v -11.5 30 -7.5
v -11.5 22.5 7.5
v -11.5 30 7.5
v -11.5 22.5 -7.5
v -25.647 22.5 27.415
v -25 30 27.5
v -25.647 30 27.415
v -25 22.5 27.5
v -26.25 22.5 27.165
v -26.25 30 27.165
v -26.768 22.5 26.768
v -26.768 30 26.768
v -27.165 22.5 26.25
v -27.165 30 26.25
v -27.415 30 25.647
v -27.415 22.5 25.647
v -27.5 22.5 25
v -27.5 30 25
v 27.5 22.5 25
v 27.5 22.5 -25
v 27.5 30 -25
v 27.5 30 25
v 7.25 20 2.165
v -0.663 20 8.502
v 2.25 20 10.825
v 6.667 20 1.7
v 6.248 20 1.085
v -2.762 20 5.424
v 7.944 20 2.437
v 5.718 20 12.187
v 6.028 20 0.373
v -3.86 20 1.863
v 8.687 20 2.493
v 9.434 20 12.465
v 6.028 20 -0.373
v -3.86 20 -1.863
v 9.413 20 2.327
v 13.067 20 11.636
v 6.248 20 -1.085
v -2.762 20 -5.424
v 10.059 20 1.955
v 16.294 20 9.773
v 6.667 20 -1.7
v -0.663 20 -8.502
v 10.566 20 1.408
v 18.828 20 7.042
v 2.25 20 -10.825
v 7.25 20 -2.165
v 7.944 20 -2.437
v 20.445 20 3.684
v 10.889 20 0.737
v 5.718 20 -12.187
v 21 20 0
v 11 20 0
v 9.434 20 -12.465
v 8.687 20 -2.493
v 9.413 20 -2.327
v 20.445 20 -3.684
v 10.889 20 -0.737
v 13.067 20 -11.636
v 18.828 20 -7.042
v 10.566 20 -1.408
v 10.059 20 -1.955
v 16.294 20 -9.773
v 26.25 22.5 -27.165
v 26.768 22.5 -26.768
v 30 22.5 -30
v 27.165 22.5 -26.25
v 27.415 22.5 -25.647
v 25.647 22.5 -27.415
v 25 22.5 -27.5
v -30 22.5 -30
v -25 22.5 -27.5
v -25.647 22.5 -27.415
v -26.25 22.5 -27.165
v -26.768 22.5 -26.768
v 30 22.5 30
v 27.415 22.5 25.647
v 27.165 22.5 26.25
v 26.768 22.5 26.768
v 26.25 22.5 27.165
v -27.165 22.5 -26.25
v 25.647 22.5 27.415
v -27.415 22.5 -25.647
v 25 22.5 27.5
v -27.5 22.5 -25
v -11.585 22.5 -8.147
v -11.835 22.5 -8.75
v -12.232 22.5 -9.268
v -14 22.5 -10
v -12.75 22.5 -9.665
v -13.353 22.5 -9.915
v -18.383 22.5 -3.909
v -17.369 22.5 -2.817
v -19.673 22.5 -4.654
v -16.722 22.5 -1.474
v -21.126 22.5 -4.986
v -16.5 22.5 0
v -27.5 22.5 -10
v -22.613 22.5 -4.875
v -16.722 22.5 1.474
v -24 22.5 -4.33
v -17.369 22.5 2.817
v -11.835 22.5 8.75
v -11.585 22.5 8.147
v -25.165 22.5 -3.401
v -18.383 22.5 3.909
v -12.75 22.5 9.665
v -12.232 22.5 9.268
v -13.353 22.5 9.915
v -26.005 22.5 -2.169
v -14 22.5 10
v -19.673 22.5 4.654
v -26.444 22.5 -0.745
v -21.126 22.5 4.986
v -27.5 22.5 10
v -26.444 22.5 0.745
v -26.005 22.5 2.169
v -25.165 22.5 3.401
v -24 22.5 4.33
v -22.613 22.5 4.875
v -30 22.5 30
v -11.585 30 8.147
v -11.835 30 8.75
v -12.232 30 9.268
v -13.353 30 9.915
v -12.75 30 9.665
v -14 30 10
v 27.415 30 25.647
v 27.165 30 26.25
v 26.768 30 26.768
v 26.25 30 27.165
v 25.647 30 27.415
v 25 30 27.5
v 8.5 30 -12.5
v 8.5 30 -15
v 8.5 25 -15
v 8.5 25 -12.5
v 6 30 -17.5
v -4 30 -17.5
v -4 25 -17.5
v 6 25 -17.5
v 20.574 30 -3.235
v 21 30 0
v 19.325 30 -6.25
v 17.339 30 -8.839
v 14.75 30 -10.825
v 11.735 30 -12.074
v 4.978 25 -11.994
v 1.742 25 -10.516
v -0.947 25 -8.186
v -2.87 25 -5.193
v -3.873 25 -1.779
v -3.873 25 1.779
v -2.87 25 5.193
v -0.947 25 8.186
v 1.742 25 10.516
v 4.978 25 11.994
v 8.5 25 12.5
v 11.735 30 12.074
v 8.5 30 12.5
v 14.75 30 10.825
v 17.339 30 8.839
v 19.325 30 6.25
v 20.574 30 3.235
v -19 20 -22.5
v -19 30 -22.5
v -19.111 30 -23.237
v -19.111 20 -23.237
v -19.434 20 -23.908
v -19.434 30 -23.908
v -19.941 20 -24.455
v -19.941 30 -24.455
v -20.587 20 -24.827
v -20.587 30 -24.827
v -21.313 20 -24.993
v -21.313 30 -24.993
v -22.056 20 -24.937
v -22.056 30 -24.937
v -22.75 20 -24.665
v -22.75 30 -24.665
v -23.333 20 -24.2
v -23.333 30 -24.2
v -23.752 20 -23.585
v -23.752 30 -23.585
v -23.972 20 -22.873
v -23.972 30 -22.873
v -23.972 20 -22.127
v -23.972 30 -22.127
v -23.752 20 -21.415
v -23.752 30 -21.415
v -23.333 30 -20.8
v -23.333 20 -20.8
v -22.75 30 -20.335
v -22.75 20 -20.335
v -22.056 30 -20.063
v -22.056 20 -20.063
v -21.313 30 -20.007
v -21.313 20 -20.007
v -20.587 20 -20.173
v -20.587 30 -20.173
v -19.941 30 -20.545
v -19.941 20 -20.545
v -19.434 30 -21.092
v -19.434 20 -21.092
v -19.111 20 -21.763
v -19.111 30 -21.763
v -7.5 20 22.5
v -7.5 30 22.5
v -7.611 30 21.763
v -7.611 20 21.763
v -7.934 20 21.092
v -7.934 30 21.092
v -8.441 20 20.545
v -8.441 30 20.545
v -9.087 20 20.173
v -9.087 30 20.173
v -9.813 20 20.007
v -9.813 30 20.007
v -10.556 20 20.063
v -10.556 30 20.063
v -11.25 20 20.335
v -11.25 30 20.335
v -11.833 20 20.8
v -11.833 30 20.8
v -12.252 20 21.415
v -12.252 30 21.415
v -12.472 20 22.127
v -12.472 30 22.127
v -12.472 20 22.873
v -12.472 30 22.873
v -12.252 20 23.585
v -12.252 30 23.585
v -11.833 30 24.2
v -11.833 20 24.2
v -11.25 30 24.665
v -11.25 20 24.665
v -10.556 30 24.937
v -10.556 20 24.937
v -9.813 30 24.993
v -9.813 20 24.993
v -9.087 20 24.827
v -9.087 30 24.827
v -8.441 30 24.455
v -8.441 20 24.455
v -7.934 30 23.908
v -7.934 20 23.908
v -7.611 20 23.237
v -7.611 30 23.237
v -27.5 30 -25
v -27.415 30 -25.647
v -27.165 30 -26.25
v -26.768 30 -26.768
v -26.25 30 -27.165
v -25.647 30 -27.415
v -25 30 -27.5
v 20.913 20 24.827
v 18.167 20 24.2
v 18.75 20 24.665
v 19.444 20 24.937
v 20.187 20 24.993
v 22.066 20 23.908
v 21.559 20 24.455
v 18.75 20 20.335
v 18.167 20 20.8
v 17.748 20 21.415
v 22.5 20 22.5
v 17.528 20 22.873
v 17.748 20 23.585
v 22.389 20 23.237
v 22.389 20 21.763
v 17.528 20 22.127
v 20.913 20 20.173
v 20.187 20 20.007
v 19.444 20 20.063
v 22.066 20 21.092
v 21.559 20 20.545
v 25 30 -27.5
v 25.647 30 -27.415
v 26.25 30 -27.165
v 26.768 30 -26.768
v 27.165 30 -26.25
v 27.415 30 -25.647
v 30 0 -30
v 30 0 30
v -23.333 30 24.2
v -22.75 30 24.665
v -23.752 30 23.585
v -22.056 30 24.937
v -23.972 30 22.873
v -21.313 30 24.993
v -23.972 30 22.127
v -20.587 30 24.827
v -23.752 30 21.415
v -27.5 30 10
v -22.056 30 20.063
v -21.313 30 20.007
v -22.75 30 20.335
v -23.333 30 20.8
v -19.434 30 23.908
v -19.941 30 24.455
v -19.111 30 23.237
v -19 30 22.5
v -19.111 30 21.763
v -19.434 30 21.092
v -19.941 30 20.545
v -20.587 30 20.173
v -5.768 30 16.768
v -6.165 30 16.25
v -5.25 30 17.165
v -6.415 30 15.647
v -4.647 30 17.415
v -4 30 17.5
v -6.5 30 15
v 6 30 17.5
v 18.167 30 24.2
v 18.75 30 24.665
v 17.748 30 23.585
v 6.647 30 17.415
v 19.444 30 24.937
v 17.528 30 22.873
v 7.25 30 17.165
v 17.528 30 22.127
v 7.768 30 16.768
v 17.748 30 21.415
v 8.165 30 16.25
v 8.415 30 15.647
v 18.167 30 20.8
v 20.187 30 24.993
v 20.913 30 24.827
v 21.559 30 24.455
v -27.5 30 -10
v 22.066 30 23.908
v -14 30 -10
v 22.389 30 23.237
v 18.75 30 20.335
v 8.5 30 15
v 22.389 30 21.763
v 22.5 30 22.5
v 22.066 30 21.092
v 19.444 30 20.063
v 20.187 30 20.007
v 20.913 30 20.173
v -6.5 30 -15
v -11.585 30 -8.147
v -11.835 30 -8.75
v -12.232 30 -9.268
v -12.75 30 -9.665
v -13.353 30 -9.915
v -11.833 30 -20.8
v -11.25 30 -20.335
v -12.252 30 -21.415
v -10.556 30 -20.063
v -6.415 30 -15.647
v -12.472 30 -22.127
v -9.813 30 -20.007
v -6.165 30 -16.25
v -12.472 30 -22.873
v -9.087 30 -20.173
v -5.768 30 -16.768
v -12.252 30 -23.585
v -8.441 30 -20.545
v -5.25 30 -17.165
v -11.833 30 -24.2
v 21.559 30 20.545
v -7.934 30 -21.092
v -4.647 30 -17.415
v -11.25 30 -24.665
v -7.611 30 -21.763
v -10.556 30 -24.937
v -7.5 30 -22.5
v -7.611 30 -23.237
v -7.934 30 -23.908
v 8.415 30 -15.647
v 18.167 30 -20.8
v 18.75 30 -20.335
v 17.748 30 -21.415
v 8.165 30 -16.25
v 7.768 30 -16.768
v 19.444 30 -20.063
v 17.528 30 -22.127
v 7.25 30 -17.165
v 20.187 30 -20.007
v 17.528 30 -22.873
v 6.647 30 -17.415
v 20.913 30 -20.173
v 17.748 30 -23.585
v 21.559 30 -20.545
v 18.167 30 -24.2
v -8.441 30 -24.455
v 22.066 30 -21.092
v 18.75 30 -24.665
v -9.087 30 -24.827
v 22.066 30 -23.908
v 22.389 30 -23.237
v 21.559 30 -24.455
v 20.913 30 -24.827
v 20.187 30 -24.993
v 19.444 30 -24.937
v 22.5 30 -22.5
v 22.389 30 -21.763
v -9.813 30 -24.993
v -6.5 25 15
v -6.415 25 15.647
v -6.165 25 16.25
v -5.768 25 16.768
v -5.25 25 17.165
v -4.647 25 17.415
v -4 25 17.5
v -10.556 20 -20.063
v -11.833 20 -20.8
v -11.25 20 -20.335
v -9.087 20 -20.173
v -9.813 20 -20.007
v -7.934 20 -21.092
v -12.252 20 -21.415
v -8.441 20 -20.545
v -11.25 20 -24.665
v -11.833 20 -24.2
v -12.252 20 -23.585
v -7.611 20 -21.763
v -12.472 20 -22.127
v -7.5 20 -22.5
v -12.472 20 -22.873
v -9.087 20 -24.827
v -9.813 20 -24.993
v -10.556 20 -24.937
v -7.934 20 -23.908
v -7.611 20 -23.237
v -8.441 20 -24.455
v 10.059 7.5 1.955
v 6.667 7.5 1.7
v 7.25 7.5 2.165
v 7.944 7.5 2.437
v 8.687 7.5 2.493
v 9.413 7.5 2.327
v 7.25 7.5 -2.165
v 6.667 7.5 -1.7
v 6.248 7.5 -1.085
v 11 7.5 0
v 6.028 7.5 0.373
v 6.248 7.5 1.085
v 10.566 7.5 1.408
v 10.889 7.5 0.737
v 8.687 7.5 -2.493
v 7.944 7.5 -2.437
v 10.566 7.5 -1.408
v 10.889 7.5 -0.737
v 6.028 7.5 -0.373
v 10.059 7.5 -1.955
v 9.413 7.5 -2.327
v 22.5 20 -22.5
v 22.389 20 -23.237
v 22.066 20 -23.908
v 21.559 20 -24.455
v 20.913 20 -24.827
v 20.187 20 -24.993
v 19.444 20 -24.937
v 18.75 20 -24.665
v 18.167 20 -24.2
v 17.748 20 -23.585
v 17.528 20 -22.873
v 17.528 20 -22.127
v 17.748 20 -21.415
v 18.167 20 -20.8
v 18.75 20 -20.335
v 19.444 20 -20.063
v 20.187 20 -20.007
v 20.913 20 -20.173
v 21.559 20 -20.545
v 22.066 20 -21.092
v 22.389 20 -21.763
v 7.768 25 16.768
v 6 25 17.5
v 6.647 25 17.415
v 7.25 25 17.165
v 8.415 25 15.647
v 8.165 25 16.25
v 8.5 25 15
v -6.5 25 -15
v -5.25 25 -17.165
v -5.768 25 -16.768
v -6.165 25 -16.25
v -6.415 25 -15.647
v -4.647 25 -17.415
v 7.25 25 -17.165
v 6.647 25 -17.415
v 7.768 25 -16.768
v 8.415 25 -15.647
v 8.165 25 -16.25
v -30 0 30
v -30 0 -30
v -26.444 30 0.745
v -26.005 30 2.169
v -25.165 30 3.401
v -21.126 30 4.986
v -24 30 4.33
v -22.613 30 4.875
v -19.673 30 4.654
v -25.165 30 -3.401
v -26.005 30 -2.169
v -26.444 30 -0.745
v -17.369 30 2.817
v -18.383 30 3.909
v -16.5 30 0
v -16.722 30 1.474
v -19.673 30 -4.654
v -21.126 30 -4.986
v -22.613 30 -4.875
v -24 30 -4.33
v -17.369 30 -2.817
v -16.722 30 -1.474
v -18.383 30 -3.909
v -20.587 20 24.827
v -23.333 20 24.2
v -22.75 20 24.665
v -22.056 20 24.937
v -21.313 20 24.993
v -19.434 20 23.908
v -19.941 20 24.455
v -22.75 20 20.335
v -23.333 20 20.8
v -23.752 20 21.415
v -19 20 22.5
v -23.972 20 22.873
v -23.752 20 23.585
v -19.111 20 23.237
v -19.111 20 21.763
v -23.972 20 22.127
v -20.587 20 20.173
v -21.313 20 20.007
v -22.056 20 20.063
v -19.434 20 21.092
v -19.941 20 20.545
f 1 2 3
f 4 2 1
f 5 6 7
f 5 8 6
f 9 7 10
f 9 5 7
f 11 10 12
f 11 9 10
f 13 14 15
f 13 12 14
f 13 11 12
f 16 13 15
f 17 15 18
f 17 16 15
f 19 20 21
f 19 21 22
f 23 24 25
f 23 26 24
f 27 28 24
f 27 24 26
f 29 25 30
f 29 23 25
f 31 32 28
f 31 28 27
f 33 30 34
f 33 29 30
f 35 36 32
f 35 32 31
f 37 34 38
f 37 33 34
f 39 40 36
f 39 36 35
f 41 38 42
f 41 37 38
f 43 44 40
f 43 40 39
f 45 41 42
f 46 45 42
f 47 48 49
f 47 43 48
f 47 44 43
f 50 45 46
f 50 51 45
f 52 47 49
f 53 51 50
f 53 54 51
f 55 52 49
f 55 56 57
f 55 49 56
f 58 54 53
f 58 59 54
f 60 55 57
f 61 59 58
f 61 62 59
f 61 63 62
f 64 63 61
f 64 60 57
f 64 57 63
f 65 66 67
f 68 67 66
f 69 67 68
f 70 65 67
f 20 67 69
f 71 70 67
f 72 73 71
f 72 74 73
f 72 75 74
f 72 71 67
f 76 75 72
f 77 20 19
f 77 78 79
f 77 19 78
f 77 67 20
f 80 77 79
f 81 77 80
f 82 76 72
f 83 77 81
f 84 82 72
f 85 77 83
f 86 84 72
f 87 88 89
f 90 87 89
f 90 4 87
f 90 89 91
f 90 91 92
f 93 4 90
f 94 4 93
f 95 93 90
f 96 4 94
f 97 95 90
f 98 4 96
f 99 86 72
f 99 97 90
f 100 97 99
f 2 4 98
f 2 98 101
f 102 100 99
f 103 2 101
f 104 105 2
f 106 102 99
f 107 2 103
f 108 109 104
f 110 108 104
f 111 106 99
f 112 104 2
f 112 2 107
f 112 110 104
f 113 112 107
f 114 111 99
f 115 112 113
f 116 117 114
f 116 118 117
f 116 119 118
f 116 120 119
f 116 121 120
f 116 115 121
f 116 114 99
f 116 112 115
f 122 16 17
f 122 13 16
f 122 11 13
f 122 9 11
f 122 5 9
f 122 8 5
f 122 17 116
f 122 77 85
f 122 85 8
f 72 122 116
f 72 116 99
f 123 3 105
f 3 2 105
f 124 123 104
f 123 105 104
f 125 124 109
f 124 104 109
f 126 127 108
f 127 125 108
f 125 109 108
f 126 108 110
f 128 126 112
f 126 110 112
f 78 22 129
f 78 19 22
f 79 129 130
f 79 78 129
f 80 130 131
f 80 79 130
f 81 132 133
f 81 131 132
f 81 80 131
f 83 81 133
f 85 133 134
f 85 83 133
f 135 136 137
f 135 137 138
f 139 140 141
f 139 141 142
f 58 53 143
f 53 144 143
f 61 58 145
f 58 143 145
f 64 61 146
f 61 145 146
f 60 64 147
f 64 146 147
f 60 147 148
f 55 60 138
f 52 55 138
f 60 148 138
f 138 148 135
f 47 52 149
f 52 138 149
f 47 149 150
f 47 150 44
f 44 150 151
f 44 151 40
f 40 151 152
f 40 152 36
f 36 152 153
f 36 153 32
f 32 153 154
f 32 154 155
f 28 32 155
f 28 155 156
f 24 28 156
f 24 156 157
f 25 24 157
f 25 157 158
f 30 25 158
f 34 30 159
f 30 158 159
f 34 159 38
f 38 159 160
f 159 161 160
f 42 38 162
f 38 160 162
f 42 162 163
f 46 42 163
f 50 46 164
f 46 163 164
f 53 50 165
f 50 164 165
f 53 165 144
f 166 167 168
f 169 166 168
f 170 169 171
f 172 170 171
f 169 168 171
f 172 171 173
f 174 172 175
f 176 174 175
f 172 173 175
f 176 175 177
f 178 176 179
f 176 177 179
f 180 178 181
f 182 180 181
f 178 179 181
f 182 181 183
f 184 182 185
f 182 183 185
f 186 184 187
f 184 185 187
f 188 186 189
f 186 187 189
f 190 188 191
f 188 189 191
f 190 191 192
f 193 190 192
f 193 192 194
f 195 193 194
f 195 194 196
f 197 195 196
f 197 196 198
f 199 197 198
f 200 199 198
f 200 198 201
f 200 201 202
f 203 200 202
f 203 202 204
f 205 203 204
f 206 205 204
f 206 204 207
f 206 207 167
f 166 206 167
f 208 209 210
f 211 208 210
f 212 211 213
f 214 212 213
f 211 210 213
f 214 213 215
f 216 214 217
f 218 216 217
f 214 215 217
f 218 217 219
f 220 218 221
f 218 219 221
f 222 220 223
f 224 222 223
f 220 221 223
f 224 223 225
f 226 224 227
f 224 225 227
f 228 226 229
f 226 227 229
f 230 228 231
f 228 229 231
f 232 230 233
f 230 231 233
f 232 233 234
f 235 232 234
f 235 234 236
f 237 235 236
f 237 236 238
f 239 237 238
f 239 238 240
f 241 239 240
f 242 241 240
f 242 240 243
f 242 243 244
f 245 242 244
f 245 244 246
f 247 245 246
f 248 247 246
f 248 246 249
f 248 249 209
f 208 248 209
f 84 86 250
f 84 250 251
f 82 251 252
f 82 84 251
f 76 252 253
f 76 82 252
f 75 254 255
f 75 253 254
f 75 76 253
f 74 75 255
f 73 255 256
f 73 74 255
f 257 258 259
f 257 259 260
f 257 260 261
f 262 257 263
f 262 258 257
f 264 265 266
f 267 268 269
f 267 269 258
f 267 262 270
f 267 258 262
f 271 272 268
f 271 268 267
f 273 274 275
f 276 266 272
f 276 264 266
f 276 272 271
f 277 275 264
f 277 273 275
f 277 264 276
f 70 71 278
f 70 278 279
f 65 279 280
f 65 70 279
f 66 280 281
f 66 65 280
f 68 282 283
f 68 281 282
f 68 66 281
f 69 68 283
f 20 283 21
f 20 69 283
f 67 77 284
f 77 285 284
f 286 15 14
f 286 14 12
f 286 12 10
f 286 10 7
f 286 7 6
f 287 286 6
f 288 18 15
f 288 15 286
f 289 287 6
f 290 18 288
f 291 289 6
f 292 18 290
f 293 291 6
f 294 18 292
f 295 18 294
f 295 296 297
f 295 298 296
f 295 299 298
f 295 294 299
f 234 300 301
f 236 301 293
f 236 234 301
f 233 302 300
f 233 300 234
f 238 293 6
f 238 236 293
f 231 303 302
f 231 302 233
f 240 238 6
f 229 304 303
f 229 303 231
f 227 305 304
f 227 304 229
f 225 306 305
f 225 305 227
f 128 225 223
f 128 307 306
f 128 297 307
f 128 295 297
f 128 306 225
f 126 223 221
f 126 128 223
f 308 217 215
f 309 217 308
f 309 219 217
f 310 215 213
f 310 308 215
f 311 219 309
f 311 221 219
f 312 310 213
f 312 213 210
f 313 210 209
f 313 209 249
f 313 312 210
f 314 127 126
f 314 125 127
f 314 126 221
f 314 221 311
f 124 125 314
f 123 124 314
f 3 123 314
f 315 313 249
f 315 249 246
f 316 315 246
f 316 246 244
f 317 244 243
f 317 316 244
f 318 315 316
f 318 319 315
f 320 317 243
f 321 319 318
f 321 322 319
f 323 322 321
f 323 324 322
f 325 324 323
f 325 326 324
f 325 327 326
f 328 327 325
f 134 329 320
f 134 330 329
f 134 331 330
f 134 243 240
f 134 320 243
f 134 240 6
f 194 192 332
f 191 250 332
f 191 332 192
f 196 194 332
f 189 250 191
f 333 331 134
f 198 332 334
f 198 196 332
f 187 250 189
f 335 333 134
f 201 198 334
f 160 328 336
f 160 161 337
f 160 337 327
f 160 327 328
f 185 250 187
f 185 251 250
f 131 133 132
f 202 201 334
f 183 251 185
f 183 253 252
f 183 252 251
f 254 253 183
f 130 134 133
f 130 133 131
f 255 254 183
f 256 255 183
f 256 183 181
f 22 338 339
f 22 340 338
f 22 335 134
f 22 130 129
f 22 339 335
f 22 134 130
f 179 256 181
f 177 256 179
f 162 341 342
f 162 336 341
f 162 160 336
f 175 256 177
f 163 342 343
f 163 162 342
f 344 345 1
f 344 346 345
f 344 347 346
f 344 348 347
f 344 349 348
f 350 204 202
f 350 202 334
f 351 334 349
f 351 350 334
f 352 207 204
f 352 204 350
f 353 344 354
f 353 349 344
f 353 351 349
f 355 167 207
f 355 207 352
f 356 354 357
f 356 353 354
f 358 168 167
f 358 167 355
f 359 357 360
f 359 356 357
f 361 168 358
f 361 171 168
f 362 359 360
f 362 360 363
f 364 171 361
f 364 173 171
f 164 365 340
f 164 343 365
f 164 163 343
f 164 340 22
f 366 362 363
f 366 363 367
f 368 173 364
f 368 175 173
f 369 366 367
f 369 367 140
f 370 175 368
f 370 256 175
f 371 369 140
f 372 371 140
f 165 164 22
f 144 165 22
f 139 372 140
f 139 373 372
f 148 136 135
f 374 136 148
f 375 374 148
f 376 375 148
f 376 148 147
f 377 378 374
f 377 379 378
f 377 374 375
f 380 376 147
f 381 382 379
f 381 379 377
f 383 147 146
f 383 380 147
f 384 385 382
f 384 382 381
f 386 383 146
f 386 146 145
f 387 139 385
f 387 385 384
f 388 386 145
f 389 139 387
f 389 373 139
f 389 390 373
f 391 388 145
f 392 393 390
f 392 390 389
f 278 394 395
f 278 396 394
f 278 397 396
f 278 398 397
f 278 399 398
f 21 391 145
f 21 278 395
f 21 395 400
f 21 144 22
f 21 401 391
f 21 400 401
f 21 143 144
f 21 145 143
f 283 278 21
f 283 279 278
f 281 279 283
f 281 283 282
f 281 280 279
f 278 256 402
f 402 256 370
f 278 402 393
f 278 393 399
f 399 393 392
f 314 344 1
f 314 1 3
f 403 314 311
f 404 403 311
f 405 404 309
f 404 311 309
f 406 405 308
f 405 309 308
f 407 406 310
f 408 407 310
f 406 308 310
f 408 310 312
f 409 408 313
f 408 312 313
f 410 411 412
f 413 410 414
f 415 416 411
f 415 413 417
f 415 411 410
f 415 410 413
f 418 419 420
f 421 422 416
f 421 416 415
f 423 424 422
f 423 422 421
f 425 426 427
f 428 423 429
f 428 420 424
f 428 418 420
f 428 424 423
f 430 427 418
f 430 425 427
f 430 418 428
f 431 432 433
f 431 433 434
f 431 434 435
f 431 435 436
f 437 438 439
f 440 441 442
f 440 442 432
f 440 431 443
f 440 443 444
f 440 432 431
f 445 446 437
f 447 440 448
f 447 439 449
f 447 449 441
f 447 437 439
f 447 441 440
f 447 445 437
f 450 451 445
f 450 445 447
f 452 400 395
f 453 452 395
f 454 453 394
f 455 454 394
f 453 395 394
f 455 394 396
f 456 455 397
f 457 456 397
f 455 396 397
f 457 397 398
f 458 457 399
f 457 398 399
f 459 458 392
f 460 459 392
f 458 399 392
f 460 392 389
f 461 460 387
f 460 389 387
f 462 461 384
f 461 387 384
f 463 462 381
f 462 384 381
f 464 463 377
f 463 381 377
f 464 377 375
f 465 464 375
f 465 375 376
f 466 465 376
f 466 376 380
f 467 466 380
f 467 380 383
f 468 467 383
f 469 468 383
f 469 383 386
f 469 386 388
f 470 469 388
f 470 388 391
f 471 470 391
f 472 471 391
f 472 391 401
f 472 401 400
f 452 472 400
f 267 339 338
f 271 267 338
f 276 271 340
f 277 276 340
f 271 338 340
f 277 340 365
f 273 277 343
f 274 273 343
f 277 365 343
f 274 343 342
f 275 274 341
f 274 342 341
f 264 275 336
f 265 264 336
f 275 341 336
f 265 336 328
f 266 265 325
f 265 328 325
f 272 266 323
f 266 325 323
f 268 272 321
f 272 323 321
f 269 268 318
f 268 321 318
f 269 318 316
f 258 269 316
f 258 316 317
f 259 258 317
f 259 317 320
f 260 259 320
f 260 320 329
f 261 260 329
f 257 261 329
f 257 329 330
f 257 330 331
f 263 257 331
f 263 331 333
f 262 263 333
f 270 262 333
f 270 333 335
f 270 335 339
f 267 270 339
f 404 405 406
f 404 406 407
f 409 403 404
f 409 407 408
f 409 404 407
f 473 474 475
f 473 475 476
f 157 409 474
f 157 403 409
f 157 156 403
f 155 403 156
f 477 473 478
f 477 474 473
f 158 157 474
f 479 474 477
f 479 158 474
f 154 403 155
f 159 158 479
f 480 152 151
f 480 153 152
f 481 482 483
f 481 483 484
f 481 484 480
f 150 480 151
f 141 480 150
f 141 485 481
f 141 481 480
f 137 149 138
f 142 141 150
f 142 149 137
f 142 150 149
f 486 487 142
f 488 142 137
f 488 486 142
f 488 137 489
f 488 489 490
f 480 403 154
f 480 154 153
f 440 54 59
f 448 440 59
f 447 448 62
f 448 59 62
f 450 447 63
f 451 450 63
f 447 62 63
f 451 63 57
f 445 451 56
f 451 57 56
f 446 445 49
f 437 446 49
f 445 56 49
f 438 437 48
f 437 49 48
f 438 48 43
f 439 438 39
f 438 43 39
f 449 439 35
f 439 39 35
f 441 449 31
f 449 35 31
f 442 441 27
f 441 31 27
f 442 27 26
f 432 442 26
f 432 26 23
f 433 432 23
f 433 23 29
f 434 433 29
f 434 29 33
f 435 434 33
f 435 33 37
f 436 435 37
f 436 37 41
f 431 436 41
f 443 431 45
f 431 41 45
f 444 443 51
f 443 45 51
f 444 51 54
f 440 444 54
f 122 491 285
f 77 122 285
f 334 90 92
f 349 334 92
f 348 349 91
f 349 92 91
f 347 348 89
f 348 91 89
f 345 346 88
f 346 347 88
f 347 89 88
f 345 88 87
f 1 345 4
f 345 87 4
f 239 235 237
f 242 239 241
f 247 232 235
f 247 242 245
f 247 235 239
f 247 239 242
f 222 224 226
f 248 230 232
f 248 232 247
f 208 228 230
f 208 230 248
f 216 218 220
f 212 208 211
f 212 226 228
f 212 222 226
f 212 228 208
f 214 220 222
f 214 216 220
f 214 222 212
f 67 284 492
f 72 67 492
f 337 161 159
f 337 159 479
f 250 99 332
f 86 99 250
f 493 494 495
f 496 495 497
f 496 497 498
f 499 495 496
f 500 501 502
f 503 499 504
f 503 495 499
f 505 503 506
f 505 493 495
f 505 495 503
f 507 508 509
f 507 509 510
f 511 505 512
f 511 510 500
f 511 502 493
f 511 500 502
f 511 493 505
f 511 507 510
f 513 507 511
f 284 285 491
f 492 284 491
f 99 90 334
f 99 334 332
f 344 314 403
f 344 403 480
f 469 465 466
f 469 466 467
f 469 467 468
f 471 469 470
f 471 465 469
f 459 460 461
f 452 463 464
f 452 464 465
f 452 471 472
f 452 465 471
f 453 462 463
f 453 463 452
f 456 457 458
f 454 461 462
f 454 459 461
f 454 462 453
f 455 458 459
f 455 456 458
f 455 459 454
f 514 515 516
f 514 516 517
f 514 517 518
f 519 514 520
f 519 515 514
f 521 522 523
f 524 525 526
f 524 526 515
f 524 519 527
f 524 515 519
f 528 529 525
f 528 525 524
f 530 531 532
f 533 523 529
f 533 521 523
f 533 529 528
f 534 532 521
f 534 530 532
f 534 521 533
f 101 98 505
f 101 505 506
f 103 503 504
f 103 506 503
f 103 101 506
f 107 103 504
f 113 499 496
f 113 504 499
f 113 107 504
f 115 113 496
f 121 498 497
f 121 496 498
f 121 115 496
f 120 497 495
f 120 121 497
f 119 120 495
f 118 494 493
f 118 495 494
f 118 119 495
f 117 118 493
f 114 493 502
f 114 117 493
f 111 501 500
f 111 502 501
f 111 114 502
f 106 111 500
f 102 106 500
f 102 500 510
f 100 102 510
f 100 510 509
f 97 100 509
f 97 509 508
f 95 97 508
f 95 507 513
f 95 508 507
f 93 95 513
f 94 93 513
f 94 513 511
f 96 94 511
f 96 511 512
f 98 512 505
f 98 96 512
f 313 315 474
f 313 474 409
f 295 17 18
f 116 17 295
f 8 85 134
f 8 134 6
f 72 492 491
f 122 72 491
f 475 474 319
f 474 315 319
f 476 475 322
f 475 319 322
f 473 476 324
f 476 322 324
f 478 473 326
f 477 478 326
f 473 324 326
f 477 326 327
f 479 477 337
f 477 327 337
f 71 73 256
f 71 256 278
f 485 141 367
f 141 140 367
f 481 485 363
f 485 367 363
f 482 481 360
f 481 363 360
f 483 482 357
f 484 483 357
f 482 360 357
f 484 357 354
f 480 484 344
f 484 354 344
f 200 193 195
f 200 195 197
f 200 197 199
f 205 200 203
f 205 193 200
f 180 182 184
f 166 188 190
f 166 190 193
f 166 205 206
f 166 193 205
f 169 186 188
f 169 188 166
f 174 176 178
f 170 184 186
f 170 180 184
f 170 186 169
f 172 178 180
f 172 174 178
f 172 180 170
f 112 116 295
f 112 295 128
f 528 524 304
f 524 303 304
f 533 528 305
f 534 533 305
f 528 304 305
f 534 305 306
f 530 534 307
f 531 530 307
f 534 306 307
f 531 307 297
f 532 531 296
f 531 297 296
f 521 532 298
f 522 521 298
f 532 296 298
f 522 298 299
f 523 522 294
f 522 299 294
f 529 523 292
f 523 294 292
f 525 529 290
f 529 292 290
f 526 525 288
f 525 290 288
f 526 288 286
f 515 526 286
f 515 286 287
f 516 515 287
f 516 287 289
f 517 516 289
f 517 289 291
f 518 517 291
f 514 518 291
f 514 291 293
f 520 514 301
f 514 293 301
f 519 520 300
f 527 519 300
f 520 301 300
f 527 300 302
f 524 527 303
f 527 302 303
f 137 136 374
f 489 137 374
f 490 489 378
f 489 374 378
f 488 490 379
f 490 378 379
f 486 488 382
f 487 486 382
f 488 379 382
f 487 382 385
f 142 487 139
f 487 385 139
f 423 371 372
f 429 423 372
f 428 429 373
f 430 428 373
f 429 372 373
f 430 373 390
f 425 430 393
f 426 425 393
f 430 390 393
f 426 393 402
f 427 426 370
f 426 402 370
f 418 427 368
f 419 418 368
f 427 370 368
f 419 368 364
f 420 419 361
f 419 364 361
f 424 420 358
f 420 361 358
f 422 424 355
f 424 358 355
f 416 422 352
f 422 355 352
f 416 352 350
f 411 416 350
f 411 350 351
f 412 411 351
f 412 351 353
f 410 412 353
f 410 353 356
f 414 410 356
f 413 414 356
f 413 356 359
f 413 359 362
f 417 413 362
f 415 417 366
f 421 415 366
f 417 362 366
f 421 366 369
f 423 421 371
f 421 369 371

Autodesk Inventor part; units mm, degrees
ref_plane "YZ Plane" through (0, 0, 0) normal (1, 0, 0) x (0, 1, 0)
ref_plane "XZ Plane" through (0, 0, 0) normal (0, 1, 0) x (-1, 0, 0)
ref_plane "XY Plane" through (0, 0, 0) normal (0, 0, 1) x (1, 0, 0)
sketch "Sketch1" plane through (0, 0, 0) normal (0, 1, 0) x (-1, 0, 0)
  line L0 (30, 30) -> (-30, 30)
  line L1 (-30, 30) -> (-30, -30)
  line L2 (-30, -30) -> (30, -30)
  line L3 (30, -30) -> (30, 30)
  line L4 (30, 30) -> (-30, -30) construction
  line L5 (-30, 30) -> (30, -30) construction
  point P0 (0, 0)
  dimension "d0" = 60
  dimension "d1" = 60
extrude "Extrusion1" add sketch "Sketch1" along normal blind 22.5
sketch "Sketch2" plane through (0, 22.5, 0) normal (0, 1, 0) x (1, 0, 0)
  line L0 (-25, 27.5) -> (25, 27.5)
  line L1 (27.5, 25) -> (27.5, -25)
  line L2 (25, -27.5) -> (-25, -27.5)
  line L3 (-27.5, 27.5) -> (27.5, -27.5) construction
  line L4 (27.5, 27.5) -> (-27.5, -27.5) construction
  arc A0 (-27.5, -25) -> (-25, -27.5) centre (-25, -25) ccw
  arc A1 (-25, 27.5) -> (-27.5, 25) centre (-25, 25) ccw
  arc A2 (27.5, 25) -> (25, 27.5) centre (25, 25) ccw
  arc A3 (25, -27.5) -> (27.5, -25) centre (25, -25) ccw
  line L5 (-27.5, -10) -> (-14, -10)
  line L6 (-11.5, -7.5) -> (-11.5, 7.5)
  line L7 (-14, 10) -> (-27.5, 10)
  line L8 (-27.5, -10) -> (-11.5, 10) construction
  line L9 (-11.5, -10) -> (-27.5, 10) construction
  line L10 (30, -30) -> (30, 30) projected
  arc A4 (-14, -10) -> (-11.5, -7.5) centre (-14, -7.5) ccw
  arc A5 (-11.5, 7.5) -> (-14, 10) centre (-14, 7.5) ccw
  line L11 (-27.5, -25) -> (-27.5, -10)
  line L12 (-27.5, 10) -> (-27.5, 25)
  point P0 (0, 0)
  point P1 (-19.5, 0)
  dimension "d4" = 55
  dimension "d5" = 55
  dimension "d6" = 2.5
  dimension "d19" = 16
  dimension "d20" = 20
  dimension "d21" = 41.5
  dimension "d22" = 2.5
extrude "Extrusion2" add sketch "Sketch2" along normal blind 7.5
sketch "Sketch3" plane through (0, 30, 0) normal (0, 1, 0) x (1, 0, 0)
  circle A0 centre (8.5, 0) radius 12.5
  line L0 (30, -30) -> (30, 30) projected
  point P0 (0, 0)
  dimension "d9" = 25
  dimension "d10" = 21.5
extrude "Extrusion3" cut sketch "Sketch3" against normal blind 10
sketch "Sketch4" plane through (0, 30, 0) normal (0, 1, 0) x (1, 0, 0)
  line L0 (-4, 17.5) -> (6, 17.5)
  line L1 (8.5, 15) -> (8.5, -15)
  line L2 (6, -17.5) -> (-4, -17.5)
  line L3 (-6.5, -15) -> (-6.5, 15)
  line L4 (-6.5, 17.5) -> (8.5, -17.5) construction
  line L5 (8.5, 17.5) -> (-6.5, -17.5) construction
  line L6 (30, -30) -> (30, 30) projected
  arc A0 (-6.5, -15) -> (-4, -17.5) centre (-4, -15) ccw
  arc A1 (-4, 17.5) -> (-6.5, 15) centre (-4, 15) ccw
  arc A2 (8.5, 15) -> (6, 17.5) centre (6, 15) ccw
  arc A3 (6, -17.5) -> (8.5, -15) centre (6, -15) ccw
  point P0 (0, 0)
  point P1 (1, 0)
  dimension "d13" = 15
  dimension "d14" = 35
  dimension "d15" = 36.5
  dimension "d16" = 2.5
extrude "Extrusion4" cut sketch "Sketch4" against normal blind 5
sketch "Sketch5" plane through (0, 22.5, 0) normal (0, 1, 0) x (1, 0, 0)
  circle A0 centre (-21.5, 0) radius 5
  line L0 (30, -30) -> (30, 30) projected
  point P0 (0, 0)
  dimension "d23" = 10
  dimension "d24" = 51.5
extrude "Extrusion5" add sketch "Sketch5" along normal blind 7.5
sketch "Sketch6" plane through (8.5, 20, 0) normal (0, 1, 0) x (1, 0, 0)
  circle A0 centre (0, 0) radius 2.5
  point P0 (-8.5, 0)
  dimension "d27" = 5
extrude "Extrusion6" cut sketch "Sketch6" against normal blind 12.5
sketch "Sketch7" plane through (0, 30, 0) normal (0, 1, 0) x (1, 0, 0)
  circle A0 centre (20, -22.5) radius 2.5
  line L0 (30, -30) -> (30, 30) projected
  line L1 (-30, -30) -> (30, -30) projected
  circle A1 centre (20, 22.5) radius 2.5
  circle A2 centre (-10, -22.5) radius 2.5
  circle A3 centre (-10, 22.5) radius 2.5
  circle A4 centre (-21.5, -22.5) radius 2.5
  circle A5 centre (-21.5, 22.5) radius 2.5
  point P0 (0, 0)
  dimension "d30" = 5
  dimension "d31" = 10
  dimension "d32" = 7.5
  dimension "d35" = 45
  dimension "d40" = 5
  dimension "d41" = 40
  dimension "d44" = 45
  dimension "d47" = 11.5
extrude "Extrusion7" cut sketch "Sketch7" against normal blind 10
properties part number "A2P1"
